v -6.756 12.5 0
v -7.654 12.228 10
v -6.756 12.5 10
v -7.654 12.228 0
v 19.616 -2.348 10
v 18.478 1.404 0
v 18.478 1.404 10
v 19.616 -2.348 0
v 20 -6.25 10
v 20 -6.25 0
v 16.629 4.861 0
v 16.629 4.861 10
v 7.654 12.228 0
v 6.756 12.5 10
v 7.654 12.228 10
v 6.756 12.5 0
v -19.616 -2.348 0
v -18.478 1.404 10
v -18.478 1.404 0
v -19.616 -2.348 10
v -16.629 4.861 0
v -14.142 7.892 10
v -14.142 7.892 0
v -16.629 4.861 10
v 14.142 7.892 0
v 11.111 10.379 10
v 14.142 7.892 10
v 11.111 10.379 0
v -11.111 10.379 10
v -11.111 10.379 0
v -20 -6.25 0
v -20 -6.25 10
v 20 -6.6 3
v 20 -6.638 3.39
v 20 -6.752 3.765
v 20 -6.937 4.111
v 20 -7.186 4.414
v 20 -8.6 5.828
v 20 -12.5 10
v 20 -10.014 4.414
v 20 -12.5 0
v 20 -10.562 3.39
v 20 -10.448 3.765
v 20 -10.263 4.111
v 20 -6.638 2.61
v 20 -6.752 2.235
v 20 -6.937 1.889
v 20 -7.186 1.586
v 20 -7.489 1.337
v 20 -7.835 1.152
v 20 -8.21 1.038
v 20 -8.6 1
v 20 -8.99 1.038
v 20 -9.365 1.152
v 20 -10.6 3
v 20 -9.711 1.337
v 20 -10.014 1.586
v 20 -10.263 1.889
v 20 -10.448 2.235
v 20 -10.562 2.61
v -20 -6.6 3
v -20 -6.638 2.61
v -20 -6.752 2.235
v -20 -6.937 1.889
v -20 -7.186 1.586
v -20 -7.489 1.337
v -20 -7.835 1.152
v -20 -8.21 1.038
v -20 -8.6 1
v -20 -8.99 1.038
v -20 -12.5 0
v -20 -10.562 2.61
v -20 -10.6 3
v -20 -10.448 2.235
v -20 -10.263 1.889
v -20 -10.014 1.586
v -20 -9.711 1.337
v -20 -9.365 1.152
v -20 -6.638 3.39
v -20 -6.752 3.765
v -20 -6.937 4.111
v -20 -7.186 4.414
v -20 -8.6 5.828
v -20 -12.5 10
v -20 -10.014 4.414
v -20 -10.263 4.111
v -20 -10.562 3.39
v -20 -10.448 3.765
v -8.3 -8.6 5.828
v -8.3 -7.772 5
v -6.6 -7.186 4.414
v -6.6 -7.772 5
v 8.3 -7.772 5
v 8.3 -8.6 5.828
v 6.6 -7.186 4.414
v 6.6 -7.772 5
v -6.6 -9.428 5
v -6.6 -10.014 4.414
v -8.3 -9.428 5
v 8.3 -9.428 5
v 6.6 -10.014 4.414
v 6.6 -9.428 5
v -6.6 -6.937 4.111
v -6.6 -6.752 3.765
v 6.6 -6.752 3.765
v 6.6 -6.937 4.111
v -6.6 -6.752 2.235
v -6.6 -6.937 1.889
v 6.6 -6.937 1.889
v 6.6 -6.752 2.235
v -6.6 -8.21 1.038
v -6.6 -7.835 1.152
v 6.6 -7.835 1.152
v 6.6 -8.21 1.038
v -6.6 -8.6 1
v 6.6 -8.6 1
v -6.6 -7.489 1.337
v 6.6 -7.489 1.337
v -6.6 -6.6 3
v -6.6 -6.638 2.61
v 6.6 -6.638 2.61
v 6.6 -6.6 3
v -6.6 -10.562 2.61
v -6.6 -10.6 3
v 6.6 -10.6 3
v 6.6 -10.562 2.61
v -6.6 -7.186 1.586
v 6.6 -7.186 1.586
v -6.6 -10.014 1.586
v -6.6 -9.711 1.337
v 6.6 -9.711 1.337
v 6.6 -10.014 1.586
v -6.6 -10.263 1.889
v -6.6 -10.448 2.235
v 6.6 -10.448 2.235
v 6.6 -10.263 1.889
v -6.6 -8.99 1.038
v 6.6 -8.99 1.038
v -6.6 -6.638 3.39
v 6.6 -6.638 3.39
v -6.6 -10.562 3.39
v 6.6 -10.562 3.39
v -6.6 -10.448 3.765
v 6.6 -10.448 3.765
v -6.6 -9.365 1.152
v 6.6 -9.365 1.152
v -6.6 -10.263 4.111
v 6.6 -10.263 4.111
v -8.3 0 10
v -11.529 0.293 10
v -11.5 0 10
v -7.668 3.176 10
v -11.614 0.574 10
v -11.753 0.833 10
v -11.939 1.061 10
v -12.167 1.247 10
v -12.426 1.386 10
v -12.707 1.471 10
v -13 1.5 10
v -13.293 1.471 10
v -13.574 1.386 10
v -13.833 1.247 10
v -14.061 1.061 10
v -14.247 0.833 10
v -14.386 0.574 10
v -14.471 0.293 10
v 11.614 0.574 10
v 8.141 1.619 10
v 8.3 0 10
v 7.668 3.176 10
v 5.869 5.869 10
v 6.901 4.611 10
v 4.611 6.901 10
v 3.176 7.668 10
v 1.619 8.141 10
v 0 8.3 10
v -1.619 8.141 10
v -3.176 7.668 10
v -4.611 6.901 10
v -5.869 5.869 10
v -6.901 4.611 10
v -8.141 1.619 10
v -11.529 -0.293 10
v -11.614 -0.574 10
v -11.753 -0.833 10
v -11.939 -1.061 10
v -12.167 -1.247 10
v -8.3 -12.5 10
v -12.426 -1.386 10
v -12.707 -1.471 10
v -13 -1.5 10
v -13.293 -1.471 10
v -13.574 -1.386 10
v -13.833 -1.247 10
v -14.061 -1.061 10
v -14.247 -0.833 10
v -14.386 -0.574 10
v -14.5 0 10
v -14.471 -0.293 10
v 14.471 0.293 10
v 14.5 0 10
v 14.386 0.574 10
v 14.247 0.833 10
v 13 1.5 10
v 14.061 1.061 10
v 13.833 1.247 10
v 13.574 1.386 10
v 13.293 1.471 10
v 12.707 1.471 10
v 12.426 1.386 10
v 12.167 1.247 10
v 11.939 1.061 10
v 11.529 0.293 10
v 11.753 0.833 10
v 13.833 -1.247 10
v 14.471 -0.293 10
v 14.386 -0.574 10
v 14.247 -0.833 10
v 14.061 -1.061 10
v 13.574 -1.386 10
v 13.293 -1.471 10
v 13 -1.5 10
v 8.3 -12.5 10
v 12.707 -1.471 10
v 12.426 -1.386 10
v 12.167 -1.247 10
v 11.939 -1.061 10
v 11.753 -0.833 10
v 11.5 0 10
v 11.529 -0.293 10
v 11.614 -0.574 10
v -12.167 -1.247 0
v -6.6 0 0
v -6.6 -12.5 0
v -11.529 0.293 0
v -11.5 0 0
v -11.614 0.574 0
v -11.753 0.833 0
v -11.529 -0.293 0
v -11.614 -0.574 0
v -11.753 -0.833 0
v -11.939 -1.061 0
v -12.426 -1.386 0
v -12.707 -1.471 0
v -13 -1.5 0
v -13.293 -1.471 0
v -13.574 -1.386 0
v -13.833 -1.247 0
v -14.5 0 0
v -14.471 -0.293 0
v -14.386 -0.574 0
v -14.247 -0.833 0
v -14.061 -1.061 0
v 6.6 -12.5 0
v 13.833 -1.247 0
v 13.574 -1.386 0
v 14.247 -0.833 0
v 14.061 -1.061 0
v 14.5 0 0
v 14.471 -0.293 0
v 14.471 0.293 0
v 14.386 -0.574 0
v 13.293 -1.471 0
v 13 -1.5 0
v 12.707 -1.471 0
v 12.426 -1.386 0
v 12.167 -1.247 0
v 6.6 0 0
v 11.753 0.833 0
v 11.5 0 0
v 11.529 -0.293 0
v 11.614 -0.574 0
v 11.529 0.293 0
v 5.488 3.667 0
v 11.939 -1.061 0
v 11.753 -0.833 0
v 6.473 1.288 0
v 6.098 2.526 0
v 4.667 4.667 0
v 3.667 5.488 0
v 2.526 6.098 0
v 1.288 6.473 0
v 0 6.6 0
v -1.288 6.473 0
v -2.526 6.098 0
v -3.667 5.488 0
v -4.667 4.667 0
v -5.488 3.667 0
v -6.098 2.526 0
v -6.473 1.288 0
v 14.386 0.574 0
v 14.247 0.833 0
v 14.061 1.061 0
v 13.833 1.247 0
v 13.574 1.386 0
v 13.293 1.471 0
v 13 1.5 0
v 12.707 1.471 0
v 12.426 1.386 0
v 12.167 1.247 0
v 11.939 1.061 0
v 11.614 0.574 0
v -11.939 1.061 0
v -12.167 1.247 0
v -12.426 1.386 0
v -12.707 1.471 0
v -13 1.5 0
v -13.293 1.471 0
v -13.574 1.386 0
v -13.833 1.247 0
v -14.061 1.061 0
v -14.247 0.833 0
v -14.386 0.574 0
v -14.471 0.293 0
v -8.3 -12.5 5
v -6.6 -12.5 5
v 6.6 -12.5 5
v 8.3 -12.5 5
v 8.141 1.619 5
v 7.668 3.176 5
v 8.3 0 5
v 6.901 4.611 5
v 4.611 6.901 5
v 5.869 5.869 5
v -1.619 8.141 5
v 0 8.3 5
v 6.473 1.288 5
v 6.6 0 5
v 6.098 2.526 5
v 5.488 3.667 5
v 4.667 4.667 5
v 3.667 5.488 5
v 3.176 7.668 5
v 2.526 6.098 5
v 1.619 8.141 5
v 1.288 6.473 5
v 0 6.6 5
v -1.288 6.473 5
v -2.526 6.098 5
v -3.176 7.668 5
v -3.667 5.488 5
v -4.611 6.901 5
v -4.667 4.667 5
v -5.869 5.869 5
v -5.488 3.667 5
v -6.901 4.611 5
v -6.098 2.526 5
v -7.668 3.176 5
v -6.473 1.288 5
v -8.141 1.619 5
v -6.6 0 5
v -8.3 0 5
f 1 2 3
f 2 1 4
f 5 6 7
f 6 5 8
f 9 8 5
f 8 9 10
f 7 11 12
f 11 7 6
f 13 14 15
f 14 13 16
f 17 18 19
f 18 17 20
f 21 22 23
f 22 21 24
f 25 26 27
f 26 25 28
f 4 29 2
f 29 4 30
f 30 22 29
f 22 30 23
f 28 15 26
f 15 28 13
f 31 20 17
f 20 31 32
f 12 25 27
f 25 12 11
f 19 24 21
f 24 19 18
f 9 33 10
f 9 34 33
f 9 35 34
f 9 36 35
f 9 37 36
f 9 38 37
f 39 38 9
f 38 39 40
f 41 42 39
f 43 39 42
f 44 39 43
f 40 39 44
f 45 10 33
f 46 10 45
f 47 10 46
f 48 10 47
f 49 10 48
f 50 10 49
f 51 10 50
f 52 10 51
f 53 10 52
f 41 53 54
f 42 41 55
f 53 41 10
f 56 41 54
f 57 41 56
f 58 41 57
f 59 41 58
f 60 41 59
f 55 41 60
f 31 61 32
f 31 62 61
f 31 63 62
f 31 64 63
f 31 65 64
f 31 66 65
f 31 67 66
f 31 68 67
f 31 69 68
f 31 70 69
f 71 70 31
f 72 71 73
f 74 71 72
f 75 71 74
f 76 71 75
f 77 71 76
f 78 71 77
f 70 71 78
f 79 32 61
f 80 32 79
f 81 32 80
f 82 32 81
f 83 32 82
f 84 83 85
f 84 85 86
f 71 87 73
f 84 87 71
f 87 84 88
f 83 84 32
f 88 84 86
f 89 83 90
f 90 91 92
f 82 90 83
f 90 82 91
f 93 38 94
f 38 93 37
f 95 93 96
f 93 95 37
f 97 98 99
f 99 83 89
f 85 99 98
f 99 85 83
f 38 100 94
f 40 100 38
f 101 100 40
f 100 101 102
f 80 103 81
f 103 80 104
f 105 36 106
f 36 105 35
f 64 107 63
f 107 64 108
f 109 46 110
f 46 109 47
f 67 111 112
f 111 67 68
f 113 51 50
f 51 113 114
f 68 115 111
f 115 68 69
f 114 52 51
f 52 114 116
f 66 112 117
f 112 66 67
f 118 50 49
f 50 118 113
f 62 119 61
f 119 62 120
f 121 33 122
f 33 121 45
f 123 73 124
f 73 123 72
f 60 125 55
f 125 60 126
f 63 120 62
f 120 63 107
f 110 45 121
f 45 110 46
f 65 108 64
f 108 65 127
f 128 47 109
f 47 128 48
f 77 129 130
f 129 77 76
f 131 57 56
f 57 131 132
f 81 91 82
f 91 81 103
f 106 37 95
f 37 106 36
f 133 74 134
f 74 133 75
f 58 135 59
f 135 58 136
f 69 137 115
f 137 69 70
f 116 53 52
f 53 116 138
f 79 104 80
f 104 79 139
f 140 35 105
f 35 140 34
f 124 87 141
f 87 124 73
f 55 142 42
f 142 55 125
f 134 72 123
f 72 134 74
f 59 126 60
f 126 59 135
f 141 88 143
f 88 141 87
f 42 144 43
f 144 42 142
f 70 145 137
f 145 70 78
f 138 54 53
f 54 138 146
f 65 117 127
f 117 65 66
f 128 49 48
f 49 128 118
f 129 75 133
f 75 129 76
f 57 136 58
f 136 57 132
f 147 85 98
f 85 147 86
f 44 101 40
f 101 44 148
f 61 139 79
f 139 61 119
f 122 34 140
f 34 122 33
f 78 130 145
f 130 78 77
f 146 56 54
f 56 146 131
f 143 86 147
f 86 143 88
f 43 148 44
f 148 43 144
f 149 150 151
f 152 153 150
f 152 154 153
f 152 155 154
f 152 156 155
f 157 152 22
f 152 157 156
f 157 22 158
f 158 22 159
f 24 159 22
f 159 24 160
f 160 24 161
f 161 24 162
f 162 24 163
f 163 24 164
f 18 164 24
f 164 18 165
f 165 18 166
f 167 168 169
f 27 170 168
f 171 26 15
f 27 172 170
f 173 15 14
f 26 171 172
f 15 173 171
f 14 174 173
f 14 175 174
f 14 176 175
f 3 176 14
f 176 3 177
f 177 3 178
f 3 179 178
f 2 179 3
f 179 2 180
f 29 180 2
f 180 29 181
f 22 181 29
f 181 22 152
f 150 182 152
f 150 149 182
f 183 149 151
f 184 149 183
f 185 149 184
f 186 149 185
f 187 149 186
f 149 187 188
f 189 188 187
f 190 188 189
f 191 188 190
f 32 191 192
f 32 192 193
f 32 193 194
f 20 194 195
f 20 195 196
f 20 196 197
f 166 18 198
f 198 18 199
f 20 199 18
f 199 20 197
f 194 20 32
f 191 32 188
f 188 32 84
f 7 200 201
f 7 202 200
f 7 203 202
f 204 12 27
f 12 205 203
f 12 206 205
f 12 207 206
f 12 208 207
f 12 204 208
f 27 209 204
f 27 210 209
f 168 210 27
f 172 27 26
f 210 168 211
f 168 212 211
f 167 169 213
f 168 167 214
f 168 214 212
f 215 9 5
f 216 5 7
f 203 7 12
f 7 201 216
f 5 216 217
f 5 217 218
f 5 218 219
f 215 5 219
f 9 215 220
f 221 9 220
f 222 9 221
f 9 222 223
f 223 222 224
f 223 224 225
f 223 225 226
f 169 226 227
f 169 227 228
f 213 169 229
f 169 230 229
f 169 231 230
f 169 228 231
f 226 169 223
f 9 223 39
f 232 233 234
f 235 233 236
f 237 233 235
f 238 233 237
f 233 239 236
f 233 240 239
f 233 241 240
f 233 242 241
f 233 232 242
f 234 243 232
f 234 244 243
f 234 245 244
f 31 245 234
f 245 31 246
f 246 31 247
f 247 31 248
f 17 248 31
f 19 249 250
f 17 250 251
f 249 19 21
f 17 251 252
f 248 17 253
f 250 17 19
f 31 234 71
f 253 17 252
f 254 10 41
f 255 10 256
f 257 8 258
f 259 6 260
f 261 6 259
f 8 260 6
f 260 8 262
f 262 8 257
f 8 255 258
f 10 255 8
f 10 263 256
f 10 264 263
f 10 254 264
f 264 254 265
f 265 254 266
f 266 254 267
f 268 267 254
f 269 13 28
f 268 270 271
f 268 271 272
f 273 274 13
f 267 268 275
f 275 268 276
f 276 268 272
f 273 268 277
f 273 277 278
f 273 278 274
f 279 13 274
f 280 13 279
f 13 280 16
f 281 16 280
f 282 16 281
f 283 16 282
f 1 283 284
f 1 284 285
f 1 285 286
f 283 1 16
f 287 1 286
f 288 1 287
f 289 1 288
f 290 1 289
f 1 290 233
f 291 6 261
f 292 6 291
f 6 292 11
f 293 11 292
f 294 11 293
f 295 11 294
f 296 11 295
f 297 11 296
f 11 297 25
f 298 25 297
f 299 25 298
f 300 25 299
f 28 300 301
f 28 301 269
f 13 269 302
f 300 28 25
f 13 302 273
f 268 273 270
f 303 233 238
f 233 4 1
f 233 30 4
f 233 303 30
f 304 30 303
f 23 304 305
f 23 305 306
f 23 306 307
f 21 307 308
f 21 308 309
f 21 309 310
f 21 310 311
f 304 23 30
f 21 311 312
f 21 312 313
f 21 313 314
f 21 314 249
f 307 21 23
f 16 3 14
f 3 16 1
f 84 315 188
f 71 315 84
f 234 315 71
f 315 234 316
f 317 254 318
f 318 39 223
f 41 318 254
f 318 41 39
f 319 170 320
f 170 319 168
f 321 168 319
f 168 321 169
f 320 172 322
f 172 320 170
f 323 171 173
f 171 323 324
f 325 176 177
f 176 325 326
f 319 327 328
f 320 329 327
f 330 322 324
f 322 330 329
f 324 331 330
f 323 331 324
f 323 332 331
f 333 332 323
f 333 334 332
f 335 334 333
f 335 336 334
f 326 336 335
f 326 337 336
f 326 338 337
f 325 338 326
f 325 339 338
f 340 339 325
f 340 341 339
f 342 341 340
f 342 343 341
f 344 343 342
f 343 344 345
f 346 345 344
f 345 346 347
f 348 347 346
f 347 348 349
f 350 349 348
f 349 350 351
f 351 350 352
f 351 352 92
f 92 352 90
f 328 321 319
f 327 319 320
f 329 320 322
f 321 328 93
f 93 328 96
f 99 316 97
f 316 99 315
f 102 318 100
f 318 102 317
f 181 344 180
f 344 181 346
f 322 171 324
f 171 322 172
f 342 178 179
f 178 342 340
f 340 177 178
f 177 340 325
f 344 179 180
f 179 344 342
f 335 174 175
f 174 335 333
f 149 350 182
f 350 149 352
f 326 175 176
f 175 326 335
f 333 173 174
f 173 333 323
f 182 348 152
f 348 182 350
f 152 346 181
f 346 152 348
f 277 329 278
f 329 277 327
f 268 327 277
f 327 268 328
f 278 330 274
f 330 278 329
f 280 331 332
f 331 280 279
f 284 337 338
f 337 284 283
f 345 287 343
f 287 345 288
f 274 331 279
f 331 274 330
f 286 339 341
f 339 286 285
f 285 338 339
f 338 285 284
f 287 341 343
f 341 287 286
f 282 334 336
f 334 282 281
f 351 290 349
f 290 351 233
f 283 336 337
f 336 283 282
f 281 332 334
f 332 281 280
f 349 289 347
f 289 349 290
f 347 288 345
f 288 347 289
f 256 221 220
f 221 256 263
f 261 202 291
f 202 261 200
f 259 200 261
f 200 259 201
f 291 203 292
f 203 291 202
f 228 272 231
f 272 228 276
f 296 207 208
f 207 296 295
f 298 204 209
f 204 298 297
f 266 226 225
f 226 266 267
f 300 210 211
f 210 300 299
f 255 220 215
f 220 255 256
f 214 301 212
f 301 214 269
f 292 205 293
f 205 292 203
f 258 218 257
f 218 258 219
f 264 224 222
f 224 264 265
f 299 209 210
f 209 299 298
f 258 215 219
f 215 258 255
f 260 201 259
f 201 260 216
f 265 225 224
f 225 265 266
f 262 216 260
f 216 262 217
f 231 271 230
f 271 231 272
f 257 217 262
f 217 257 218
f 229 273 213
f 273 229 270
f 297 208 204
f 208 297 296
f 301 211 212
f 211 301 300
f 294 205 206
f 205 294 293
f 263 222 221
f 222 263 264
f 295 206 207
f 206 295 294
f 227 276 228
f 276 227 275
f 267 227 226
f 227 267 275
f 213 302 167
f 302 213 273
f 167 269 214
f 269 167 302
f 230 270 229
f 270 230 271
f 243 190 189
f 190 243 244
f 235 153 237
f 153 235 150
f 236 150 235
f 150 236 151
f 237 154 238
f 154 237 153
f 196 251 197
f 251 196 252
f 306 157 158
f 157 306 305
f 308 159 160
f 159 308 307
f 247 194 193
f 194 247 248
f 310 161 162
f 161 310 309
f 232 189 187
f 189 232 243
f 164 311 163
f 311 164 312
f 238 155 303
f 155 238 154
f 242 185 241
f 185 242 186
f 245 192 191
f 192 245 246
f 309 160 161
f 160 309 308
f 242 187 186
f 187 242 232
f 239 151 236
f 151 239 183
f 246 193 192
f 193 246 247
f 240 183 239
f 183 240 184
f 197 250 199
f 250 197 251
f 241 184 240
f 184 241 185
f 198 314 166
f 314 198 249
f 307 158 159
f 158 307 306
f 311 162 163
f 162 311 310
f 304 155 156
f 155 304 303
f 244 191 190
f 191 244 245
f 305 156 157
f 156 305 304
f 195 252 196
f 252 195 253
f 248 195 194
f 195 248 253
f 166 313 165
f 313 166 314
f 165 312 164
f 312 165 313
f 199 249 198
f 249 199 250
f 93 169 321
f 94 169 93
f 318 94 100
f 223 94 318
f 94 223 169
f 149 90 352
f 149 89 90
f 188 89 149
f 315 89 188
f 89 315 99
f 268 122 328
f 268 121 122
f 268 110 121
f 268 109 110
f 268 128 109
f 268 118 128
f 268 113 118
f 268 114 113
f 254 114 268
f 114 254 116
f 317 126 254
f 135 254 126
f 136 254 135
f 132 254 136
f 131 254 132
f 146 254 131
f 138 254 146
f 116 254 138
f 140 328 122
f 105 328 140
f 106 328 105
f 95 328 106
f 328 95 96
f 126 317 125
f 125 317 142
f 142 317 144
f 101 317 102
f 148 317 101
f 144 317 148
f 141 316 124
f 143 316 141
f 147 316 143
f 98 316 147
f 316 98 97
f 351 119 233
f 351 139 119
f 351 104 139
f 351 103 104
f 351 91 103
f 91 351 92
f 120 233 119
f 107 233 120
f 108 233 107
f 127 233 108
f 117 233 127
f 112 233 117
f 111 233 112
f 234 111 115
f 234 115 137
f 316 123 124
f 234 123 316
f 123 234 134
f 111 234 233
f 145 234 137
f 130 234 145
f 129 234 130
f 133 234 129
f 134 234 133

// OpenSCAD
// Grooved Insulator Mount Adapter #3
// by Tony Buser <tbuser@gmail.com>
// uses teardrop module by Erik de Bruijn <info@erikdebruijn.nl>
// GPLv2 or later

// set them slightly larger if printer isn't perfect
barrel_diameter = 16.6; // 16 + .6
barrel_inset_diameter = 13.2; // 13 + .2

plate_length = 40;
plate_width = 25;

// probably don't want to touch the height
plate_height = 10;

// mounting bolts will need to be 15mm long?
mounting_bolt_diameter = 3;

// single horizontal bolt to clamp and hold insulator in place
// will need to be around 45mm long?
clamp_bolt_diameter = 4;

$fn = 32;

module teardrop(radius,height,truncated) {
	truncateMM = 1;
	union() {
		if (truncated == true) {
			intersection() {
				translate([0,0,height/2]) scale([1,1,height]) rotate([0,0,180]) cube([radius*2.5,radius*2,1],center=true);
				scale([1,1,height]) rotate([0,0,3*45]) cube([radius,radius,1]);
			}
		}
		if (truncated == false) {
			scale([1,1,height]) rotate([0,0,3*45]) cube([radius,radius,1]);
		}
		cylinder(r=radius, h = height);
	}
}

module plate() {
	difference() {
		cube([plate_length, plate_width, plate_height]);

		// barrel top
		translate([plate_length/2, plate_width/2, plate_height/2]) {
			cylinder(r=barrel_diameter/2, h=plate_height/2+1);
		}

		// barrel inset
		translate([plate_length/2, plate_width/2, -1]) {
			cylinder(r=barrel_inset_diameter/2, h=plate_height/2+2);
		}

		// mounting bolt left hole
		#translate([plate_length/2+13, plate_width/2, -1]) {
			cylinder(r=mounting_bolt_diameter/2, h=plate_height+2);
		}

		// mounting bolt right hole
		#translate([plate_length/2-13, plate_width/2, -1]) {
			cylinder(r=mounting_bolt_diameter/2, h=plate_height+2);
		}

		/*
		// mounting bolt head space left
		translate([plate_length/2-14, plate_width/2, -1]) {
			cylinder(r=mounting_bolt_head_diameter/2, h=plate_height/2+1);
		}

		// mounting bolt head space right
		translate([plate_length/2+11, plate_width/2, -1]) {
			cylinder(r=mounting_bolt_head_diameter/2, h=plate_height/2+1);
		}
		*/

		// clamp bolt		
		translate([-1, plate_width/2-barrel_inset_diameter/2-clamp_bolt_diameter/2, plate_height/2-clamp_bolt_diameter/2]) {
			rotate([0, 90, 0]) {
				teardrop(clamp_bolt_diameter/2, plate_length+2, false);
			}
		}
	}
}

module cutout() {
	intersection() {
		// carve a curve around the border
		union() {
			translate([plate_length/2, plate_width/2/2, -1]) {
				cylinder(r=plate_length/2, h=plate_height+2);
			}
			translate([0, -plate_width/2/2-plate_width/2, -1]) {		
				cube([plate_length, plate_width, plate_height+2]);
			}
		}

		difference() {
			plate();

			// top cutout
			translate([plate_length/2-barrel_diameter/2, -1, plate_height/2]) {
				cube([barrel_diameter, plate_width/2+1, plate_height/2+1]);
			}

			// bottom cutout
			translate([plate_length/2-barrel_inset_diameter/2, -1, -1]) {
				cube([barrel_inset_diameter, plate_width/2+1, plate_height/2+2]);
			}
		}
	}
}

module print() {	
	// center and orient it to print correctly
	translate([-plate_length/2, -plate_width/2, 0]) cutout();
}

//plate();
//cutout();
print();
